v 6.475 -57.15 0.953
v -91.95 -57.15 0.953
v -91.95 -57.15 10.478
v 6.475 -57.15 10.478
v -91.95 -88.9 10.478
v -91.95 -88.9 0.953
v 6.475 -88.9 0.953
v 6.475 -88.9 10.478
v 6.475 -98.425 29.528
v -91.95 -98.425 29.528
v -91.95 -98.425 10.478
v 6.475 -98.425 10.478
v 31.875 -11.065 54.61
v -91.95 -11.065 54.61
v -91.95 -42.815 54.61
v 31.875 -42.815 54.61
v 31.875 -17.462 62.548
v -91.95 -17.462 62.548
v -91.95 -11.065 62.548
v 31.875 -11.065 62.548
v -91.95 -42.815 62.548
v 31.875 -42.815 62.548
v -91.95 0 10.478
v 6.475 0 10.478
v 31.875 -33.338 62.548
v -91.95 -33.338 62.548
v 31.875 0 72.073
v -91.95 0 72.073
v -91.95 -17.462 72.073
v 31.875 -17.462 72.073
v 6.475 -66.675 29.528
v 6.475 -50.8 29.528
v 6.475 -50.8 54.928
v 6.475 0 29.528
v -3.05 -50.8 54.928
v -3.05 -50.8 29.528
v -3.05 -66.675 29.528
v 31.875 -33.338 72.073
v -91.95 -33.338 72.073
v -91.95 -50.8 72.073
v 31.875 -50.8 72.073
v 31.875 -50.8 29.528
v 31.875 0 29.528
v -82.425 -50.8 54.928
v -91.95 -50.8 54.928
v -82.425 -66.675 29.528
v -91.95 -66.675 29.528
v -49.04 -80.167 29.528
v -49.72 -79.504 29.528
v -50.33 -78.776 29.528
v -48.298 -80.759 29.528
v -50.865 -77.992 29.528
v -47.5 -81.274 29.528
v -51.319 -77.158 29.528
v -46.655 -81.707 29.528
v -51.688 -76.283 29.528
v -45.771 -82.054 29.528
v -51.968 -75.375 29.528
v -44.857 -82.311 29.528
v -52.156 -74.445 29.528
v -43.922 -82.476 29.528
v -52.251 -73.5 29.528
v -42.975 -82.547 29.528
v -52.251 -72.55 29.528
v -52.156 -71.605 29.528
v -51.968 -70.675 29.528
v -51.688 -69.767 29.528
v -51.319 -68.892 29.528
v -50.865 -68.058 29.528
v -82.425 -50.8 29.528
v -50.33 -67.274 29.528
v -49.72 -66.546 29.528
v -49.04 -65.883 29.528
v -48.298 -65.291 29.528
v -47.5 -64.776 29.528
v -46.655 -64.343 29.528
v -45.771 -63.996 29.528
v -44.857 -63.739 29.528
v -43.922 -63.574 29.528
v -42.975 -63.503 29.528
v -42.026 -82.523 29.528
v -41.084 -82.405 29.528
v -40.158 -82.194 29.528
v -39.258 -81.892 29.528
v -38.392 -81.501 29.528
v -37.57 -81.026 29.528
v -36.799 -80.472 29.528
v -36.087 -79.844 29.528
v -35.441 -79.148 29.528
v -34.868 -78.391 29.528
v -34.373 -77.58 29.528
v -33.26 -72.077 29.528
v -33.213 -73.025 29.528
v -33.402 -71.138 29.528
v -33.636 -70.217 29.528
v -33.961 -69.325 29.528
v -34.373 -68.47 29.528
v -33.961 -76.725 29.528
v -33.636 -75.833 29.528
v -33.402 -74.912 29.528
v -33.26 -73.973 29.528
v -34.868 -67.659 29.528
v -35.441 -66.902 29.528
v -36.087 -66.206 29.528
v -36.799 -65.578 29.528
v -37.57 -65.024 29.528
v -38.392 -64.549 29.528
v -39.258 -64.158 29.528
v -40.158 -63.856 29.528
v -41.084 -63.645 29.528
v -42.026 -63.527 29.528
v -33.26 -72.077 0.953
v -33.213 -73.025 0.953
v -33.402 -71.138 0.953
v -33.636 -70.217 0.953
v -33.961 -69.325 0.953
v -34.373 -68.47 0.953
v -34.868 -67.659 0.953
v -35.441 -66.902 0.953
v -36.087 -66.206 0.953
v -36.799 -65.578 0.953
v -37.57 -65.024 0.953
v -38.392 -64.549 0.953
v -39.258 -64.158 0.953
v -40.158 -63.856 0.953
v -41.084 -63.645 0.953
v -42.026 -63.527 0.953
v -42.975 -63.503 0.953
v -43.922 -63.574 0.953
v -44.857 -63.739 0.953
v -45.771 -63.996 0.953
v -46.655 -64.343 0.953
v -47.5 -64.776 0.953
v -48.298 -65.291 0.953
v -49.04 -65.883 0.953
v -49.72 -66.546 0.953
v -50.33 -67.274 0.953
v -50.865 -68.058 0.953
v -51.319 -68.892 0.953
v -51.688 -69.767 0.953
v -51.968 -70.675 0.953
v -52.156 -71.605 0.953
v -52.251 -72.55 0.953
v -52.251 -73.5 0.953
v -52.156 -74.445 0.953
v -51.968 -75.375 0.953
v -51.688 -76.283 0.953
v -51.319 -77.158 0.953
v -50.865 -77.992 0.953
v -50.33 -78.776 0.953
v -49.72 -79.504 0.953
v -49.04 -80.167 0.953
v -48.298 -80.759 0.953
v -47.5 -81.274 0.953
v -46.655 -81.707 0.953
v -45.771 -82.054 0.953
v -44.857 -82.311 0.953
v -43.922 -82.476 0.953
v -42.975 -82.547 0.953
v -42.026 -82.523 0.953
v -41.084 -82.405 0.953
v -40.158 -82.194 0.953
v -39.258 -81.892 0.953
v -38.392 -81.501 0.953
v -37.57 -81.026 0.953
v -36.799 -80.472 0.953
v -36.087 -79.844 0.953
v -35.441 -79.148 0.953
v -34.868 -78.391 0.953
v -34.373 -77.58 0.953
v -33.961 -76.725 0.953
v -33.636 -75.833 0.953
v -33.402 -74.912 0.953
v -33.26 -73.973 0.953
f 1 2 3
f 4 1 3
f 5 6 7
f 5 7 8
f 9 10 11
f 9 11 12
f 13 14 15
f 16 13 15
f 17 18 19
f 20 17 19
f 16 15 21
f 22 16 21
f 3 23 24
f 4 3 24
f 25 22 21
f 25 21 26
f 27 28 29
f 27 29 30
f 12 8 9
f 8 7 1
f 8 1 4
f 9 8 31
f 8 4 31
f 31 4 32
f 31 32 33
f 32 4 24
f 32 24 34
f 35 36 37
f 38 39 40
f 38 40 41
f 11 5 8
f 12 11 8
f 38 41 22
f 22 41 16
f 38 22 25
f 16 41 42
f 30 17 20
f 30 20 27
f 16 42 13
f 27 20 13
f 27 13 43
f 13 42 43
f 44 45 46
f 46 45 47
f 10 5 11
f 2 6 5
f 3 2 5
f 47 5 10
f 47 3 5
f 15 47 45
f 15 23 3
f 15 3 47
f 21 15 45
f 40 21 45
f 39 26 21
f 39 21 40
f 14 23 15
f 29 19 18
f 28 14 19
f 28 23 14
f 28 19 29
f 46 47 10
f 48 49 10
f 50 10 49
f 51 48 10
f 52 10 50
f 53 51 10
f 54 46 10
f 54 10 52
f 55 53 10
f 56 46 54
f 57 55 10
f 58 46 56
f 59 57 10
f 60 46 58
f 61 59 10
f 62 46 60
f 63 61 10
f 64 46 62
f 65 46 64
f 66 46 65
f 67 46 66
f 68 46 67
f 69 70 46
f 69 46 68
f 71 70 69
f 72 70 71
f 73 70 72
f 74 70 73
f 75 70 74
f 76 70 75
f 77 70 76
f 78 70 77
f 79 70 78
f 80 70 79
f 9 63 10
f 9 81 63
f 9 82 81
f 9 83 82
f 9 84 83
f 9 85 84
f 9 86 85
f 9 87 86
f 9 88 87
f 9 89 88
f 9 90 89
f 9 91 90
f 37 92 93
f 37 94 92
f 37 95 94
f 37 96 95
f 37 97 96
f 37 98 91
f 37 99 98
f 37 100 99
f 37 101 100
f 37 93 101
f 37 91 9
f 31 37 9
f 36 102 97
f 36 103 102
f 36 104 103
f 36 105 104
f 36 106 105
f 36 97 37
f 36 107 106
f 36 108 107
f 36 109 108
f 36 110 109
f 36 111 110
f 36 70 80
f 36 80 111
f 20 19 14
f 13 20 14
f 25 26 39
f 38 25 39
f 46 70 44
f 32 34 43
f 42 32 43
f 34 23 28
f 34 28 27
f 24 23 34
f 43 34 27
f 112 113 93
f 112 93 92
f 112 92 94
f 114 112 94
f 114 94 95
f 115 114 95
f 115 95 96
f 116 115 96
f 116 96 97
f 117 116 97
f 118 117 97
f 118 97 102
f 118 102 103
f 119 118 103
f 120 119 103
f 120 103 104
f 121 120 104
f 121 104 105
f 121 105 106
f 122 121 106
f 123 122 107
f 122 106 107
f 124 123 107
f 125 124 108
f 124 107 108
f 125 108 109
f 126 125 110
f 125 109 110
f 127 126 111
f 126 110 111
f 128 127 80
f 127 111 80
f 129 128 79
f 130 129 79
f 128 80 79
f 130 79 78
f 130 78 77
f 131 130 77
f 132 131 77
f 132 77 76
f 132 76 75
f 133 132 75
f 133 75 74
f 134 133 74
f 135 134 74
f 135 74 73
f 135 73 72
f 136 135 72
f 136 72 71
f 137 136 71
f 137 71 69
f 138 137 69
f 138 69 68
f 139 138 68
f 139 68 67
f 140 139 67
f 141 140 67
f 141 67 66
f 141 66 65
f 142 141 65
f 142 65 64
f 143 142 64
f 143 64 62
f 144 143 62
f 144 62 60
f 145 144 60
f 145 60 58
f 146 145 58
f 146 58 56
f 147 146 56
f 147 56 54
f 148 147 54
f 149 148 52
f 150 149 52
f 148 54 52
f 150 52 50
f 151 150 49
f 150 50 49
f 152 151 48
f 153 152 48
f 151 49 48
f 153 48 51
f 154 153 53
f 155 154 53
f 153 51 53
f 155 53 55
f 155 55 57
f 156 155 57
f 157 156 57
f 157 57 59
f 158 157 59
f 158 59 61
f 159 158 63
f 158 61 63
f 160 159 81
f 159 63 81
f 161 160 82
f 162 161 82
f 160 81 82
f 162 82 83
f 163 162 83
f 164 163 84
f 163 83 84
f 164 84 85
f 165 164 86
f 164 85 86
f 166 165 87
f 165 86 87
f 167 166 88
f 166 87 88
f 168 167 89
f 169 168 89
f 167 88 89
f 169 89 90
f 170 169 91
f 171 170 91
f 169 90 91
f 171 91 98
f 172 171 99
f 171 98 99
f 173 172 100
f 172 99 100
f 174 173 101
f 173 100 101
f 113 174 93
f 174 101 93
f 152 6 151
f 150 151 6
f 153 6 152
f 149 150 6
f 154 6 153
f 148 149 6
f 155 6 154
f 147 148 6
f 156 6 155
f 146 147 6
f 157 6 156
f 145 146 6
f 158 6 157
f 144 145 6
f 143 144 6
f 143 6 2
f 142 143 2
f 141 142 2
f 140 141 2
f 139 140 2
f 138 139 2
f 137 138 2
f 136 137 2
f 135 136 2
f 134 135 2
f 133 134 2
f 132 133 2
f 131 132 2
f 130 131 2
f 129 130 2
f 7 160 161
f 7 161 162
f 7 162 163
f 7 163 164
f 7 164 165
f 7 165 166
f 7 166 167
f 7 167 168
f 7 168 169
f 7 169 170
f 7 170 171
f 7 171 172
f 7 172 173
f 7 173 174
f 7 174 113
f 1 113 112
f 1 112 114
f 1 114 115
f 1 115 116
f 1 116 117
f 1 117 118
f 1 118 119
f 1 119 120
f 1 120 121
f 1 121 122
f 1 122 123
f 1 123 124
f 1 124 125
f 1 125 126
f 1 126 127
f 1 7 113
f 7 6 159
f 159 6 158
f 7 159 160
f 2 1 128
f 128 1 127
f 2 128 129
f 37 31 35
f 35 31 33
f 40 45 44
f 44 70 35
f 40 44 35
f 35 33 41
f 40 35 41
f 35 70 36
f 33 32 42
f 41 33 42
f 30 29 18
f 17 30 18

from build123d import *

# Parameters (mm, degrees)
F0_W      = 98.425
F0_H      = 19.05
F1_DEPTH  = 98.425
F2_W      = 123.825
F2_H      = 50.8
F3_DEPTH  = 42.545
F5_W      = 9.525
F5_H      = 25.4
F6_DEPTH  = 15.875
F8_DEPTH  = 123.826
F9_W      = 9.525
F9_H      = 25.4
F10_DEPTH = 15.875
F12_DEPTH = 98.426
F13_W     = 31.75
F13_H     = 9.525
F14_DEPTH = 98.425
F15_DEPTH = 123.826
F16_R     = 9.525
F17_DEPTH = 28.576


with BuildPart() as f1:
    # F0 (on Front) → F1 (new body)
    with BuildSketch(Plane.XZ):
        with Locations((-42.737771, 20.002501)):
            Rectangle(F0_W, F0_H)
    extrude(amount=F1_DEPTH)

    # F2 (on face) → F3 (join)
    with BuildSketch(Plane.XY.offset(29.527501)):
        with Locations((-30.037771, -25.4)):
            Rectangle(F2_W, F2_H)
    extrude(amount=F3_DEPTH)

    # F5 (on face) → F6 (join)
    with BuildSketch(Plane.XZ.offset(50.8)):
        with Locations((-87.187771, 42.227501)):
            Rectangle(F5_W, F5_H)
    extrude(amount=F6_DEPTH)

    # F7 (on face) → F8 (cut, through all)
    with BuildSketch(Plane(origin=(-91.950271, 0, 0), x_dir=(0, -1, 0), z_dir=(-1, 0, 0))):
        Polygon((66.675, 54.927501), (50.8, 54.927501), (66.675, 29.527501), align=None)
    extrude(amount=-F8_DEPTH, mode=Mode.SUBTRACT)

    # F9 (on face) → F10 (join)
    with BuildSketch(Plane.XZ.offset(50.8)):
        with Locations((1.712229, 42.227501)):
            Rectangle(F9_W, F9_H)
    extrude(amount=F10_DEPTH)

    # F11 (on face) → F12 (cut, through all)
    with BuildSketch(Plane.YZ.offset(6.474729)):
        Polygon((-66.675, 29.527501), (-50.8, 54.927501), (-66.675, 54.927501), align=None)
    extrude(amount=-F12_DEPTH, mode=Mode.SUBTRACT)

    # F13 (on face) → F14 (join)
    with BuildSketch(Plane.YZ.offset(6.474729)):
        with Locations((-73.025, 5.715001)):
            Rectangle(F13_W, F13_H)
    extrude(amount=-F14_DEPTH)

    # F4 (on face) → F15 (cut, through all)
    with BuildSketch(Plane(origin=(-91.950271, 0, 0), x_dir=(0, -1, 0), z_dir=(-1, 0, 0))):
        Polygon((33.3375, 72.072501), (17.4625, 72.072501), (17.4625, 62.547501), (11.065112, 62.547501), (11.065112, 54.610001), (42.815112, 54.610001), (42.815112, 62.547501), (33.3375, 62.547501), align=None)
    extrude(amount=-F15_DEPTH, mode=Mode.SUBTRACT)

    # F16 (on face) → F17 (cut, through all)
    with BuildSketch(Plane.XY.offset(29.527501)):
        with Locations((-42.737771, -73.025)):
            Circle(F16_R)
    extrude(amount=-F17_DEPTH, mode=Mode.SUBTRACT)


solid = f1.part
